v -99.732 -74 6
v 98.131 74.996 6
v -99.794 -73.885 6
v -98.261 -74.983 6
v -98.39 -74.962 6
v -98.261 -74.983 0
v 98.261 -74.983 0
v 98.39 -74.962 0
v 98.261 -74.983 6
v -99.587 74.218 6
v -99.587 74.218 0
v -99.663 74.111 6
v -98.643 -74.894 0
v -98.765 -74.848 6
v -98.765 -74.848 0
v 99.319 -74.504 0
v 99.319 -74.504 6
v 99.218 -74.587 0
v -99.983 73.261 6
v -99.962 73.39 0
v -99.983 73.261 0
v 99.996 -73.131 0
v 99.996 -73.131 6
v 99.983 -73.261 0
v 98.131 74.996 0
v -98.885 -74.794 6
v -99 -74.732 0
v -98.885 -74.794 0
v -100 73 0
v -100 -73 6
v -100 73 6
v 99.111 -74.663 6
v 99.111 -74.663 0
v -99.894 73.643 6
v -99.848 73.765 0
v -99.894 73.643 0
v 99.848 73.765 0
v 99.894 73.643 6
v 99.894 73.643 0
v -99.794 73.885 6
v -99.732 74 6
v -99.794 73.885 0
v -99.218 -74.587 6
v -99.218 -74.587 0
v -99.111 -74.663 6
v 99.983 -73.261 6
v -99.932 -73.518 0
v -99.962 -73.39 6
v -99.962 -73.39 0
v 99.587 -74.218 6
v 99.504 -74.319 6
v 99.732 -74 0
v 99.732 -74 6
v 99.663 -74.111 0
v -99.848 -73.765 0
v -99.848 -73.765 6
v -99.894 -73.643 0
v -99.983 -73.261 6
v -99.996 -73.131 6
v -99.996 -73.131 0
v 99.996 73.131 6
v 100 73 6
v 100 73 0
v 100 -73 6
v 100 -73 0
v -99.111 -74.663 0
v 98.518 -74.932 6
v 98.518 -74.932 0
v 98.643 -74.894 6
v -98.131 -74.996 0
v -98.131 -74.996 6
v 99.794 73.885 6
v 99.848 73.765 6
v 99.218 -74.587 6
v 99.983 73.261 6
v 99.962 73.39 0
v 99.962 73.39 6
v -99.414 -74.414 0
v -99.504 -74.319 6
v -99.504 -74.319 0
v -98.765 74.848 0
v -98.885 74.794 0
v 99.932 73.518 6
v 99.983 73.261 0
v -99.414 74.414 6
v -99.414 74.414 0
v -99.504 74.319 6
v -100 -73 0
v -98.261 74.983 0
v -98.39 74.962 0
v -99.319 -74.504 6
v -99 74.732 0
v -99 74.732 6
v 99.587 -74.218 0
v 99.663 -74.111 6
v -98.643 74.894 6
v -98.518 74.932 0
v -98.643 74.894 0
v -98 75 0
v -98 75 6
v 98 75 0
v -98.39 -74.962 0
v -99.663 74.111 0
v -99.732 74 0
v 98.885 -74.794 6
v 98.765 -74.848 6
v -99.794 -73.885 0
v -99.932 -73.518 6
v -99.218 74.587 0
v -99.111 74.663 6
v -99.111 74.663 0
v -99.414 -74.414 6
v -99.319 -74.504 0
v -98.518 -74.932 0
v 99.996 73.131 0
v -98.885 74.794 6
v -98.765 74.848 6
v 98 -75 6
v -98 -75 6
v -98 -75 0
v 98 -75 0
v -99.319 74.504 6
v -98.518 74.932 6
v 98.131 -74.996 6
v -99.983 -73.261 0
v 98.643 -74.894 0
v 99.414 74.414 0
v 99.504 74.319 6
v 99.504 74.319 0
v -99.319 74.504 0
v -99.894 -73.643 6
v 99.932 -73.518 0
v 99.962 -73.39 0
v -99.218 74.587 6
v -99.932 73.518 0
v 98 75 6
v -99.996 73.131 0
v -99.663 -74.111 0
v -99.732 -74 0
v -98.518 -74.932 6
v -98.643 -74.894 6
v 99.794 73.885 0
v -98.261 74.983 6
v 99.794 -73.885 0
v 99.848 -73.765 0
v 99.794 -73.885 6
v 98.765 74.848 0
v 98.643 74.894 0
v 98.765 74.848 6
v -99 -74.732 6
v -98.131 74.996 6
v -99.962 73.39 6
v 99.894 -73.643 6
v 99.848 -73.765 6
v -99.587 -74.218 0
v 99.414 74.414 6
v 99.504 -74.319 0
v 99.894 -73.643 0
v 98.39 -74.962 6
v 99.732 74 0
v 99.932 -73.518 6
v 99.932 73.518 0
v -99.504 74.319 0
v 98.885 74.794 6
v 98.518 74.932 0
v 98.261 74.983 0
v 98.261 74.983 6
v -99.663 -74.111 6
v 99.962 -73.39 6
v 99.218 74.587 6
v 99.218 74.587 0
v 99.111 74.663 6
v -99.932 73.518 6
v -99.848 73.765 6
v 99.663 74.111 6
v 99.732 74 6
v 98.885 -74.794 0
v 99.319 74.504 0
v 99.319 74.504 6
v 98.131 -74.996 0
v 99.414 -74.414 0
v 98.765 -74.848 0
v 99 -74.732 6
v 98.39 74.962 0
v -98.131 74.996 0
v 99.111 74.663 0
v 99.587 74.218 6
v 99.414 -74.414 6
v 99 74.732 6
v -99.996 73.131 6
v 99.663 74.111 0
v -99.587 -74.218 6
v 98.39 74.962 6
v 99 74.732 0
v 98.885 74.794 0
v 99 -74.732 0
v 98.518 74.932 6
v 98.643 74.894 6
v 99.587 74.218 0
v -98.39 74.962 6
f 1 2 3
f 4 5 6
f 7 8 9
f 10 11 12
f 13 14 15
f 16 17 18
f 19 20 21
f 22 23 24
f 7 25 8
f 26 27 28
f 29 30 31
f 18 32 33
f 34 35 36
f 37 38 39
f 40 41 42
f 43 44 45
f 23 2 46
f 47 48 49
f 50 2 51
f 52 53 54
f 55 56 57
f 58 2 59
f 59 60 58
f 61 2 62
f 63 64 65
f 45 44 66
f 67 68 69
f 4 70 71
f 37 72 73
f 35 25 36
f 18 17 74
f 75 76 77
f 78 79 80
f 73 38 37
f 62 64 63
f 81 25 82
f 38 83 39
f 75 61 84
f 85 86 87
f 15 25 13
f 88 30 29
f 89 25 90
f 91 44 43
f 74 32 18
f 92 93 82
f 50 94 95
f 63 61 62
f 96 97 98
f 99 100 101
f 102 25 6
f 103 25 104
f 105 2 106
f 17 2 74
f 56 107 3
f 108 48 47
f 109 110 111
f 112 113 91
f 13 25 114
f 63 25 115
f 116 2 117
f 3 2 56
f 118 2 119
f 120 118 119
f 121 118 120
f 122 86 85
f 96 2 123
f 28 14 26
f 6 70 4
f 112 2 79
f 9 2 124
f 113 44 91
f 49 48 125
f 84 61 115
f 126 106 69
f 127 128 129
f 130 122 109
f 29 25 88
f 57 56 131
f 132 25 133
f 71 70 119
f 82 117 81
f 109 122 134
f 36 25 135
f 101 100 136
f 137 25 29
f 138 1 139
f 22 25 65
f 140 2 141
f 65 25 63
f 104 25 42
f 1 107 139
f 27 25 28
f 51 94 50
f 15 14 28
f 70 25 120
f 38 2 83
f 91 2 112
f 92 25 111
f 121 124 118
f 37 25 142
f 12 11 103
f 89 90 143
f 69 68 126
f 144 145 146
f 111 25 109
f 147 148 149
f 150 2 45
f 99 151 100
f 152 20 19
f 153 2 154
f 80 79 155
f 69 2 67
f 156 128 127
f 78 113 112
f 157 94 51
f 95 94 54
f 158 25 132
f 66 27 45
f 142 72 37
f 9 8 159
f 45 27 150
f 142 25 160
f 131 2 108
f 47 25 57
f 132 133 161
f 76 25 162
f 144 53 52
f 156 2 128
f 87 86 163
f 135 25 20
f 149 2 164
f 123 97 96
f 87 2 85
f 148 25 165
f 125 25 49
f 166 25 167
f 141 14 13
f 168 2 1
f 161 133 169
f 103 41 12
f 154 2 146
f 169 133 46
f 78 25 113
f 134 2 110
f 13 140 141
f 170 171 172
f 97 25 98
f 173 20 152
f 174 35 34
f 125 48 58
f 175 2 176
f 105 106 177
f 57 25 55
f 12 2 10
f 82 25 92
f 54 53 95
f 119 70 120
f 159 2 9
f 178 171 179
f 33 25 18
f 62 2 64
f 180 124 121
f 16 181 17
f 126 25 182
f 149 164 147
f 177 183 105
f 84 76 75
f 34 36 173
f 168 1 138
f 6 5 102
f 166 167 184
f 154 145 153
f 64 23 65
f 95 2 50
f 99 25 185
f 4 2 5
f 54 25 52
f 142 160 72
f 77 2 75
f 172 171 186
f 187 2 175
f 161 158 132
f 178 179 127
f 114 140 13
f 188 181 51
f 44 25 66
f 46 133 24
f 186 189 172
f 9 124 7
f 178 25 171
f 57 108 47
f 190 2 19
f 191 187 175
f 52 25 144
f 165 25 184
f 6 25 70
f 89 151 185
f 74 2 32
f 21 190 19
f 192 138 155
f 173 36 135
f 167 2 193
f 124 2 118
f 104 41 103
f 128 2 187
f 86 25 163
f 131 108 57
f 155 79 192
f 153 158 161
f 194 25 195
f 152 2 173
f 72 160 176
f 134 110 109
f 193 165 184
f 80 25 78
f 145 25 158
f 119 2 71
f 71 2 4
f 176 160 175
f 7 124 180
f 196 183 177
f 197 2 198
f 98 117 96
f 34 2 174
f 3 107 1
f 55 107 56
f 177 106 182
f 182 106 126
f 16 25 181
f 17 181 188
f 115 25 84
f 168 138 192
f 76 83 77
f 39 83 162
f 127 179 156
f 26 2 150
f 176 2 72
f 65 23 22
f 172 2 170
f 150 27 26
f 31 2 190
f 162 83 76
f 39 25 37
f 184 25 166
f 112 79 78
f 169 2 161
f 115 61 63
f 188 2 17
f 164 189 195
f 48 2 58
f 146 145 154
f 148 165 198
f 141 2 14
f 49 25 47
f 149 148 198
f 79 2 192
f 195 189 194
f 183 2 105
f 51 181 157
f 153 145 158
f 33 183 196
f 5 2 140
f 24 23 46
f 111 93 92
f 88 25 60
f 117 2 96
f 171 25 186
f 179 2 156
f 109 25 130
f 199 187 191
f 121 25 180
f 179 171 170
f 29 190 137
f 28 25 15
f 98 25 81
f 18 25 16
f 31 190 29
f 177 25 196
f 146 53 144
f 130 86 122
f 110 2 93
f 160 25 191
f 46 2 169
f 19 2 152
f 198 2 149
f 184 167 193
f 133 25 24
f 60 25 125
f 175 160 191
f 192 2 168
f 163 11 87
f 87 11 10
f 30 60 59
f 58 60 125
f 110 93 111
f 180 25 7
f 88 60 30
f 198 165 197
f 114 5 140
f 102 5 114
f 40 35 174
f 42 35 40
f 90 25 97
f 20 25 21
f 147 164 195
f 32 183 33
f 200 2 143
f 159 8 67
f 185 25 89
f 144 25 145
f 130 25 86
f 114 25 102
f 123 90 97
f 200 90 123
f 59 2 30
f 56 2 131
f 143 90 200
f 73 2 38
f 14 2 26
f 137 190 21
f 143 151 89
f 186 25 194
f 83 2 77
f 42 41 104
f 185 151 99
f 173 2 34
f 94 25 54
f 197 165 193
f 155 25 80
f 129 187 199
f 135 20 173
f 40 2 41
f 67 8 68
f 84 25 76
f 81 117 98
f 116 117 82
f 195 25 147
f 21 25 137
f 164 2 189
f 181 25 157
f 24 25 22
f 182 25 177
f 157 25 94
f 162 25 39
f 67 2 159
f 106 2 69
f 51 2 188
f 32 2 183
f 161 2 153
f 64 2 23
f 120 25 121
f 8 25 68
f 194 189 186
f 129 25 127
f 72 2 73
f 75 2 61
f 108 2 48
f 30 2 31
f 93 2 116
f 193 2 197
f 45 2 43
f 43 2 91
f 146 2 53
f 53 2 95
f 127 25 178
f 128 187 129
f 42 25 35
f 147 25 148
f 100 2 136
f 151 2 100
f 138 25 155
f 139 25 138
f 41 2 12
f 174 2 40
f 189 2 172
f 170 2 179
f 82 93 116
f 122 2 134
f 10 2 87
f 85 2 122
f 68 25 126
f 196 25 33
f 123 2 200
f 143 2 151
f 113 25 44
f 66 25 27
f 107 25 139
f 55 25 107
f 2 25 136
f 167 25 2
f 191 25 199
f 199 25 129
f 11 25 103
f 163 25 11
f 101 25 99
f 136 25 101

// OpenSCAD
$fn = 96;

length = 200;
width  = 150;
thickness = 6;

corner_radius = 2;

module rounded_plate(l, w, t, r){
    r2 = min(r, l/2, w/2);

    // Place the plate on Z=0..t to avoid "empty" looking renders from center=true edge cases
    translate([0, 0, t/2])
        hull() {
            for (sx = [-1, 1], sy = [-1, 1])
                translate([sx*(l/2 - r2), sy*(w/2 - r2), 0])
                    cylinder(r=r2, h=t, center=true);
        }
}

color([0.75, 0.78, 0.80])
    rounded_plate(length, width, thickness, corner_radius);
